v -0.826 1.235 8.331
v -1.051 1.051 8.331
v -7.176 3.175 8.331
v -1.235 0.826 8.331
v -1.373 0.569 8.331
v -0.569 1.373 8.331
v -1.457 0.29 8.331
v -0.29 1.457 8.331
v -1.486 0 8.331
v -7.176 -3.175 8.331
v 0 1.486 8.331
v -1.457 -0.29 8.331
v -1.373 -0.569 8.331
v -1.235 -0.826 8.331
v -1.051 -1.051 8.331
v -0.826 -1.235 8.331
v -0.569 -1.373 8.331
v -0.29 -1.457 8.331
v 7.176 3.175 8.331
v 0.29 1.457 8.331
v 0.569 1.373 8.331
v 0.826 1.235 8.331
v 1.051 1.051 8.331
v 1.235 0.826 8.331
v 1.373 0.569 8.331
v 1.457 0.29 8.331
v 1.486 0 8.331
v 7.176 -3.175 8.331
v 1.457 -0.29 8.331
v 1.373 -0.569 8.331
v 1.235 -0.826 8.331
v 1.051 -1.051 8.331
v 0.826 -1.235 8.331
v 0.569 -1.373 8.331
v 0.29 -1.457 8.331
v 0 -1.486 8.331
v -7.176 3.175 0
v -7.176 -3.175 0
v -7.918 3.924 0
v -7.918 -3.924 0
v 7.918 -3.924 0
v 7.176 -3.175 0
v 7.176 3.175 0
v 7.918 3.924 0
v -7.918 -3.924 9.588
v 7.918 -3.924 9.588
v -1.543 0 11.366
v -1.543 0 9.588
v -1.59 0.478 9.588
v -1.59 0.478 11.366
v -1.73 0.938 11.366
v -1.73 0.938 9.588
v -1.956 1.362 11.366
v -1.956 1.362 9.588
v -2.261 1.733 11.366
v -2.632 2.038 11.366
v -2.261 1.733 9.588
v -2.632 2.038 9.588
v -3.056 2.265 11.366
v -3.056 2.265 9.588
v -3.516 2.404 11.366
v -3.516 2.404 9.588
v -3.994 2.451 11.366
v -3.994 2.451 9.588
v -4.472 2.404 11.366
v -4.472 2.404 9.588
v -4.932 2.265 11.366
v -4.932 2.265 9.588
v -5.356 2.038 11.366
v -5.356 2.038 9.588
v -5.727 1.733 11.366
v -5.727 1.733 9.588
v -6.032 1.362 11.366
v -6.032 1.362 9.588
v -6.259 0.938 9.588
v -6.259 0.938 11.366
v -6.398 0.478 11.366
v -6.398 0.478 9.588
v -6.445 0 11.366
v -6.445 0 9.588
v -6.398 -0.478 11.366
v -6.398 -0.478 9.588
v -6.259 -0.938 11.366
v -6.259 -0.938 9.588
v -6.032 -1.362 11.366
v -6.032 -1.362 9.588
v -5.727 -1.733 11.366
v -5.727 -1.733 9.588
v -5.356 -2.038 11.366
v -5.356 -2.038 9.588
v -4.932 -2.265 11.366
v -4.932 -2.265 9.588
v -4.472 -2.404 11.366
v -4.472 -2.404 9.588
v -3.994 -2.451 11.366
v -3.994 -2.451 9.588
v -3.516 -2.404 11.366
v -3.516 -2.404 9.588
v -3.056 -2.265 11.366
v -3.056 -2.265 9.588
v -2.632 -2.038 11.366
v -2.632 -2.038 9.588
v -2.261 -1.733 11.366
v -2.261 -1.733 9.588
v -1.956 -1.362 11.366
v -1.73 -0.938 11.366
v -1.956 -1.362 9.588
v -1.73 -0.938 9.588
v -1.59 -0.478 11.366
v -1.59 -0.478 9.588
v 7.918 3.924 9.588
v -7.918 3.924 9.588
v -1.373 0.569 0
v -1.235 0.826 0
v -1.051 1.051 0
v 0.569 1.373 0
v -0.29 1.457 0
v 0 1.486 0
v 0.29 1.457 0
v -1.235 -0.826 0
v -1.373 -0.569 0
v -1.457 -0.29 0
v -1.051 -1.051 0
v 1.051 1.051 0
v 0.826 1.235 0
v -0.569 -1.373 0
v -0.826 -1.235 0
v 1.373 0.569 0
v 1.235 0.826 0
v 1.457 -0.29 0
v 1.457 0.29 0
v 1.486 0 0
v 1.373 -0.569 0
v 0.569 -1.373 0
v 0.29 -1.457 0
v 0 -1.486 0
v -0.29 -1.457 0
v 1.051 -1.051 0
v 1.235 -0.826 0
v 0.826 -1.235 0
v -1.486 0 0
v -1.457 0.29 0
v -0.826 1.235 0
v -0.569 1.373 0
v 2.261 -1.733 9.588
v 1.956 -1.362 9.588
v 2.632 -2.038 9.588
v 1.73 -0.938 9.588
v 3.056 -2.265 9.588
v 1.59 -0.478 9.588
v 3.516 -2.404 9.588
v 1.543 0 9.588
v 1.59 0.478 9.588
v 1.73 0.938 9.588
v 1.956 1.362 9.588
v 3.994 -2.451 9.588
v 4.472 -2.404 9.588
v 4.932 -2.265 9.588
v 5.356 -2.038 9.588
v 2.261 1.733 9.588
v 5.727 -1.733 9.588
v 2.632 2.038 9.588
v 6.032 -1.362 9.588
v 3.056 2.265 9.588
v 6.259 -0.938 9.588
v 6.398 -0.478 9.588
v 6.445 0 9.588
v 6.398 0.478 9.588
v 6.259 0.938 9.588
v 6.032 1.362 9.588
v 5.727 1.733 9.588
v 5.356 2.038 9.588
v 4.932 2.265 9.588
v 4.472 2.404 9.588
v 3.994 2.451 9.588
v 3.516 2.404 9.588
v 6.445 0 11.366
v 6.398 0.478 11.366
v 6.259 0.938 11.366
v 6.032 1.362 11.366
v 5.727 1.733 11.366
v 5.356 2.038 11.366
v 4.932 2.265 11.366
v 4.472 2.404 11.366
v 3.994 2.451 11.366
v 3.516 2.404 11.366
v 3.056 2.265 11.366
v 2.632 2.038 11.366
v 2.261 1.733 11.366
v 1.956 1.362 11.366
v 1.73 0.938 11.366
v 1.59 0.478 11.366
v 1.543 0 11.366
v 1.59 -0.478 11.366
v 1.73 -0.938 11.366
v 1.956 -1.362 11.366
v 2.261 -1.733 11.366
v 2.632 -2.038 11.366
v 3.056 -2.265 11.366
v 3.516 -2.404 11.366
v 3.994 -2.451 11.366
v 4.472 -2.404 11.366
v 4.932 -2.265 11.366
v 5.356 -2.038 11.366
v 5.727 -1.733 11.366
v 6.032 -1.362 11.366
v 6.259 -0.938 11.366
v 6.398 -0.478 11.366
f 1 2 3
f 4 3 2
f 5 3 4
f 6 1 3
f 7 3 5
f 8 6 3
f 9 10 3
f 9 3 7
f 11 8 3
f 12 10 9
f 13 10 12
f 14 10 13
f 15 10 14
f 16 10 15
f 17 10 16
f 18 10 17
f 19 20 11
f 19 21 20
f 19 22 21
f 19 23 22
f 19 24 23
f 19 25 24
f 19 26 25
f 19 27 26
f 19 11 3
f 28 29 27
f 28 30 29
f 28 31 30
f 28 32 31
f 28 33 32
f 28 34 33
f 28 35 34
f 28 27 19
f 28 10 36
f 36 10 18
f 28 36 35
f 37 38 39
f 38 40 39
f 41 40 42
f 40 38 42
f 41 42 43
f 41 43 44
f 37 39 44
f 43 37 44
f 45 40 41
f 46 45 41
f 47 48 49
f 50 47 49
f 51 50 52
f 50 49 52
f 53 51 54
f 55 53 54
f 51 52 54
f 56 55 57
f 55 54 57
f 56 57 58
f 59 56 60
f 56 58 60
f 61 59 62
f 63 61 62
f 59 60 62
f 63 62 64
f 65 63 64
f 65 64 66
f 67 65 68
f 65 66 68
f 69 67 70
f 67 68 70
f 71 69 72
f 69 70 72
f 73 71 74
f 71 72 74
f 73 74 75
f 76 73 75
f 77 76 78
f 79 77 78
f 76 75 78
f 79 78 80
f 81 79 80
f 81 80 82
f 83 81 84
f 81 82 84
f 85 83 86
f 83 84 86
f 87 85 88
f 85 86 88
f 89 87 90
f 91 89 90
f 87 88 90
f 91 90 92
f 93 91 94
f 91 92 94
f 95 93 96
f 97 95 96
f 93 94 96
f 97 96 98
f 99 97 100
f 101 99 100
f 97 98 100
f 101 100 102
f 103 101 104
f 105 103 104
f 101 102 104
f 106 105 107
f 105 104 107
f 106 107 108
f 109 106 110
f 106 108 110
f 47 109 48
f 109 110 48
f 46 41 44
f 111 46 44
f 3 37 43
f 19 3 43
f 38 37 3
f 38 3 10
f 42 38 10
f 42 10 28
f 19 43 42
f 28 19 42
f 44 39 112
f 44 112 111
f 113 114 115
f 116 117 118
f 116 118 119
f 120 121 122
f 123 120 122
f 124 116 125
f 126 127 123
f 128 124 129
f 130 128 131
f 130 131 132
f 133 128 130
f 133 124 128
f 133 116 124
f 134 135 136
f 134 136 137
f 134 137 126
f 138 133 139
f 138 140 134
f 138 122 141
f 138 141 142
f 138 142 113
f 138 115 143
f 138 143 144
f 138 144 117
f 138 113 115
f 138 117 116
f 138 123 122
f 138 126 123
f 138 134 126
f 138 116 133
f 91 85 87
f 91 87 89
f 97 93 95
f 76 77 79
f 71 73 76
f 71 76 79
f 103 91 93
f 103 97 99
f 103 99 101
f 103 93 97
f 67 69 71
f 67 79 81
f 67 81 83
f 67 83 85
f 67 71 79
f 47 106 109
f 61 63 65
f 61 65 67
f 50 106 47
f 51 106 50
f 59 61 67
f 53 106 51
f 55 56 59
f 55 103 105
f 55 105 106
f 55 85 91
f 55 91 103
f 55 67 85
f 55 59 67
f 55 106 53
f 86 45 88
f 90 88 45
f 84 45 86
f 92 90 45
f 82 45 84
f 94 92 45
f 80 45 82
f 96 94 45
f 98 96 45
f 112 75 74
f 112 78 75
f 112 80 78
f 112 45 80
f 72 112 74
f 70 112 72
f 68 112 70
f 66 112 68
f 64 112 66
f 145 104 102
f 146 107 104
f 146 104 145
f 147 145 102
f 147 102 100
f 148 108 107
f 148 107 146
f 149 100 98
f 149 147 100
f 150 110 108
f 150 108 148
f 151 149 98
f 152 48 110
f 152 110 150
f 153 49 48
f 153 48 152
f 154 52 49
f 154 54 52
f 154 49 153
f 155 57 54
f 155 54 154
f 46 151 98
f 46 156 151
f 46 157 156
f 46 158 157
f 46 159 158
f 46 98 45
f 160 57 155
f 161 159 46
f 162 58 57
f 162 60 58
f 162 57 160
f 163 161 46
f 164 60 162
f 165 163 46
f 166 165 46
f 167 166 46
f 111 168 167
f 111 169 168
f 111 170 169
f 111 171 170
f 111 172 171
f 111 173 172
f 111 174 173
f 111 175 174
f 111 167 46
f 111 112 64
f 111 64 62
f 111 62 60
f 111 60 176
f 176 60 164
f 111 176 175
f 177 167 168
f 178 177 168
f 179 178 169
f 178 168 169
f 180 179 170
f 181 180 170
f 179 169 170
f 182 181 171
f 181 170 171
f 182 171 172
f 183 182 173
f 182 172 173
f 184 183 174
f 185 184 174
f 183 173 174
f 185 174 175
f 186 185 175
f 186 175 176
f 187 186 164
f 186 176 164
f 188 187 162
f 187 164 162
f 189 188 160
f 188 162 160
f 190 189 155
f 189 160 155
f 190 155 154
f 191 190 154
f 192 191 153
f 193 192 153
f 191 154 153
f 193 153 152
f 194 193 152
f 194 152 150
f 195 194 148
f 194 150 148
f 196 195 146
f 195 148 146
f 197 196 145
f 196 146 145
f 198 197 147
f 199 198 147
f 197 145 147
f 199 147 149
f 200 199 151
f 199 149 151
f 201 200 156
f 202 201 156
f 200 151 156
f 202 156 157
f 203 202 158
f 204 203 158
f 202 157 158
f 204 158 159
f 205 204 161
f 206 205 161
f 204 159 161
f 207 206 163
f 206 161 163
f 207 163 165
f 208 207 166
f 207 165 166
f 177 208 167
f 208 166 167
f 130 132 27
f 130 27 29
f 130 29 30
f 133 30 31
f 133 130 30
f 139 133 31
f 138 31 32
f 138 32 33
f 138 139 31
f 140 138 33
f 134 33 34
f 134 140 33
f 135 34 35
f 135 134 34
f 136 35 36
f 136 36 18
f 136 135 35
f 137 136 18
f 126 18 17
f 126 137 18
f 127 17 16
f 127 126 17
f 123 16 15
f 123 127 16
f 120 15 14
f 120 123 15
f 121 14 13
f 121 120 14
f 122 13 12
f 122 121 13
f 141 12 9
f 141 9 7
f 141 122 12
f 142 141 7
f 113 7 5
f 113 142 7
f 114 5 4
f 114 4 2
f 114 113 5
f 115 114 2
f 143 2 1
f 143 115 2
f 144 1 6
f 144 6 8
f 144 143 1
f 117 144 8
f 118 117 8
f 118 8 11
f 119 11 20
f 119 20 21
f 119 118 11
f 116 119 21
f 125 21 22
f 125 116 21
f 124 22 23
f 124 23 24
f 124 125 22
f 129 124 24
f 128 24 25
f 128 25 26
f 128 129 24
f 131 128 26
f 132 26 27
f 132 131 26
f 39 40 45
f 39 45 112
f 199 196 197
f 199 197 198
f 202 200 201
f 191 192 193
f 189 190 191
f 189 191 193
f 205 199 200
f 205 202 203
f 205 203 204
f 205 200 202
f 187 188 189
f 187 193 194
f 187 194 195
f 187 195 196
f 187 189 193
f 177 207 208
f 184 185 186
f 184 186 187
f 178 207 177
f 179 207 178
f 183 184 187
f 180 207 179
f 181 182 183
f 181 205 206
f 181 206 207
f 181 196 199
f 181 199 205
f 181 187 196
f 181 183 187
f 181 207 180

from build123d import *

# Parameters (mm, degrees)
F0_W     = 15.8369
F0_H     = 7.8486
F1_DEPTH = 9.5885
F2_R     = 2.4511
F4_DEPTH = 1.778
F3_R     = 2.4511
F5_DEPTH = 1.778
F6_W     = 14.351
F6_H     = 6.35
F8_DEPTH = 8.3312
F7_R     = 1.4859
F9_DEPTH = 8.3312


with BuildPart() as f1:
    # F0 (on Top) → F1 (new body)
    with BuildSketch(Plane.XY):
        Rectangle(F0_W, F0_H)
    extrude(amount=F1_DEPTH)

    # F2 (on face) → F4 (join)
    with BuildSketch(Plane.XY.offset(9.5885)):
        with Locations((-3.99415, 0)):
            Circle(F2_R)
    extrude(amount=F4_DEPTH)

    # F3 (on face) → F5 (join)
    with BuildSketch(Plane.XY.offset(9.5885)):
        with Locations((3.99415, 0)):
            Circle(F3_R)
    extrude(amount=F5_DEPTH)

    # F6 (on face) → F8 (cut)
    with BuildSketch(Plane(origin=(0, 0, 0), x_dir=(1, 0, 0), z_dir=(0, 0, -1))):
        Rectangle(F6_W, F6_H)
    extrude(amount=-F8_DEPTH, mode=Mode.SUBTRACT)

    # F7 (on face) → F9 (join)
    with BuildSketch(Plane(origin=(0, 0, 0), x_dir=(1, 0, 0), z_dir=(0, 0, -1))):
        Circle(F7_R)
    extrude(amount=-F9_DEPTH)


solid = f1.part
